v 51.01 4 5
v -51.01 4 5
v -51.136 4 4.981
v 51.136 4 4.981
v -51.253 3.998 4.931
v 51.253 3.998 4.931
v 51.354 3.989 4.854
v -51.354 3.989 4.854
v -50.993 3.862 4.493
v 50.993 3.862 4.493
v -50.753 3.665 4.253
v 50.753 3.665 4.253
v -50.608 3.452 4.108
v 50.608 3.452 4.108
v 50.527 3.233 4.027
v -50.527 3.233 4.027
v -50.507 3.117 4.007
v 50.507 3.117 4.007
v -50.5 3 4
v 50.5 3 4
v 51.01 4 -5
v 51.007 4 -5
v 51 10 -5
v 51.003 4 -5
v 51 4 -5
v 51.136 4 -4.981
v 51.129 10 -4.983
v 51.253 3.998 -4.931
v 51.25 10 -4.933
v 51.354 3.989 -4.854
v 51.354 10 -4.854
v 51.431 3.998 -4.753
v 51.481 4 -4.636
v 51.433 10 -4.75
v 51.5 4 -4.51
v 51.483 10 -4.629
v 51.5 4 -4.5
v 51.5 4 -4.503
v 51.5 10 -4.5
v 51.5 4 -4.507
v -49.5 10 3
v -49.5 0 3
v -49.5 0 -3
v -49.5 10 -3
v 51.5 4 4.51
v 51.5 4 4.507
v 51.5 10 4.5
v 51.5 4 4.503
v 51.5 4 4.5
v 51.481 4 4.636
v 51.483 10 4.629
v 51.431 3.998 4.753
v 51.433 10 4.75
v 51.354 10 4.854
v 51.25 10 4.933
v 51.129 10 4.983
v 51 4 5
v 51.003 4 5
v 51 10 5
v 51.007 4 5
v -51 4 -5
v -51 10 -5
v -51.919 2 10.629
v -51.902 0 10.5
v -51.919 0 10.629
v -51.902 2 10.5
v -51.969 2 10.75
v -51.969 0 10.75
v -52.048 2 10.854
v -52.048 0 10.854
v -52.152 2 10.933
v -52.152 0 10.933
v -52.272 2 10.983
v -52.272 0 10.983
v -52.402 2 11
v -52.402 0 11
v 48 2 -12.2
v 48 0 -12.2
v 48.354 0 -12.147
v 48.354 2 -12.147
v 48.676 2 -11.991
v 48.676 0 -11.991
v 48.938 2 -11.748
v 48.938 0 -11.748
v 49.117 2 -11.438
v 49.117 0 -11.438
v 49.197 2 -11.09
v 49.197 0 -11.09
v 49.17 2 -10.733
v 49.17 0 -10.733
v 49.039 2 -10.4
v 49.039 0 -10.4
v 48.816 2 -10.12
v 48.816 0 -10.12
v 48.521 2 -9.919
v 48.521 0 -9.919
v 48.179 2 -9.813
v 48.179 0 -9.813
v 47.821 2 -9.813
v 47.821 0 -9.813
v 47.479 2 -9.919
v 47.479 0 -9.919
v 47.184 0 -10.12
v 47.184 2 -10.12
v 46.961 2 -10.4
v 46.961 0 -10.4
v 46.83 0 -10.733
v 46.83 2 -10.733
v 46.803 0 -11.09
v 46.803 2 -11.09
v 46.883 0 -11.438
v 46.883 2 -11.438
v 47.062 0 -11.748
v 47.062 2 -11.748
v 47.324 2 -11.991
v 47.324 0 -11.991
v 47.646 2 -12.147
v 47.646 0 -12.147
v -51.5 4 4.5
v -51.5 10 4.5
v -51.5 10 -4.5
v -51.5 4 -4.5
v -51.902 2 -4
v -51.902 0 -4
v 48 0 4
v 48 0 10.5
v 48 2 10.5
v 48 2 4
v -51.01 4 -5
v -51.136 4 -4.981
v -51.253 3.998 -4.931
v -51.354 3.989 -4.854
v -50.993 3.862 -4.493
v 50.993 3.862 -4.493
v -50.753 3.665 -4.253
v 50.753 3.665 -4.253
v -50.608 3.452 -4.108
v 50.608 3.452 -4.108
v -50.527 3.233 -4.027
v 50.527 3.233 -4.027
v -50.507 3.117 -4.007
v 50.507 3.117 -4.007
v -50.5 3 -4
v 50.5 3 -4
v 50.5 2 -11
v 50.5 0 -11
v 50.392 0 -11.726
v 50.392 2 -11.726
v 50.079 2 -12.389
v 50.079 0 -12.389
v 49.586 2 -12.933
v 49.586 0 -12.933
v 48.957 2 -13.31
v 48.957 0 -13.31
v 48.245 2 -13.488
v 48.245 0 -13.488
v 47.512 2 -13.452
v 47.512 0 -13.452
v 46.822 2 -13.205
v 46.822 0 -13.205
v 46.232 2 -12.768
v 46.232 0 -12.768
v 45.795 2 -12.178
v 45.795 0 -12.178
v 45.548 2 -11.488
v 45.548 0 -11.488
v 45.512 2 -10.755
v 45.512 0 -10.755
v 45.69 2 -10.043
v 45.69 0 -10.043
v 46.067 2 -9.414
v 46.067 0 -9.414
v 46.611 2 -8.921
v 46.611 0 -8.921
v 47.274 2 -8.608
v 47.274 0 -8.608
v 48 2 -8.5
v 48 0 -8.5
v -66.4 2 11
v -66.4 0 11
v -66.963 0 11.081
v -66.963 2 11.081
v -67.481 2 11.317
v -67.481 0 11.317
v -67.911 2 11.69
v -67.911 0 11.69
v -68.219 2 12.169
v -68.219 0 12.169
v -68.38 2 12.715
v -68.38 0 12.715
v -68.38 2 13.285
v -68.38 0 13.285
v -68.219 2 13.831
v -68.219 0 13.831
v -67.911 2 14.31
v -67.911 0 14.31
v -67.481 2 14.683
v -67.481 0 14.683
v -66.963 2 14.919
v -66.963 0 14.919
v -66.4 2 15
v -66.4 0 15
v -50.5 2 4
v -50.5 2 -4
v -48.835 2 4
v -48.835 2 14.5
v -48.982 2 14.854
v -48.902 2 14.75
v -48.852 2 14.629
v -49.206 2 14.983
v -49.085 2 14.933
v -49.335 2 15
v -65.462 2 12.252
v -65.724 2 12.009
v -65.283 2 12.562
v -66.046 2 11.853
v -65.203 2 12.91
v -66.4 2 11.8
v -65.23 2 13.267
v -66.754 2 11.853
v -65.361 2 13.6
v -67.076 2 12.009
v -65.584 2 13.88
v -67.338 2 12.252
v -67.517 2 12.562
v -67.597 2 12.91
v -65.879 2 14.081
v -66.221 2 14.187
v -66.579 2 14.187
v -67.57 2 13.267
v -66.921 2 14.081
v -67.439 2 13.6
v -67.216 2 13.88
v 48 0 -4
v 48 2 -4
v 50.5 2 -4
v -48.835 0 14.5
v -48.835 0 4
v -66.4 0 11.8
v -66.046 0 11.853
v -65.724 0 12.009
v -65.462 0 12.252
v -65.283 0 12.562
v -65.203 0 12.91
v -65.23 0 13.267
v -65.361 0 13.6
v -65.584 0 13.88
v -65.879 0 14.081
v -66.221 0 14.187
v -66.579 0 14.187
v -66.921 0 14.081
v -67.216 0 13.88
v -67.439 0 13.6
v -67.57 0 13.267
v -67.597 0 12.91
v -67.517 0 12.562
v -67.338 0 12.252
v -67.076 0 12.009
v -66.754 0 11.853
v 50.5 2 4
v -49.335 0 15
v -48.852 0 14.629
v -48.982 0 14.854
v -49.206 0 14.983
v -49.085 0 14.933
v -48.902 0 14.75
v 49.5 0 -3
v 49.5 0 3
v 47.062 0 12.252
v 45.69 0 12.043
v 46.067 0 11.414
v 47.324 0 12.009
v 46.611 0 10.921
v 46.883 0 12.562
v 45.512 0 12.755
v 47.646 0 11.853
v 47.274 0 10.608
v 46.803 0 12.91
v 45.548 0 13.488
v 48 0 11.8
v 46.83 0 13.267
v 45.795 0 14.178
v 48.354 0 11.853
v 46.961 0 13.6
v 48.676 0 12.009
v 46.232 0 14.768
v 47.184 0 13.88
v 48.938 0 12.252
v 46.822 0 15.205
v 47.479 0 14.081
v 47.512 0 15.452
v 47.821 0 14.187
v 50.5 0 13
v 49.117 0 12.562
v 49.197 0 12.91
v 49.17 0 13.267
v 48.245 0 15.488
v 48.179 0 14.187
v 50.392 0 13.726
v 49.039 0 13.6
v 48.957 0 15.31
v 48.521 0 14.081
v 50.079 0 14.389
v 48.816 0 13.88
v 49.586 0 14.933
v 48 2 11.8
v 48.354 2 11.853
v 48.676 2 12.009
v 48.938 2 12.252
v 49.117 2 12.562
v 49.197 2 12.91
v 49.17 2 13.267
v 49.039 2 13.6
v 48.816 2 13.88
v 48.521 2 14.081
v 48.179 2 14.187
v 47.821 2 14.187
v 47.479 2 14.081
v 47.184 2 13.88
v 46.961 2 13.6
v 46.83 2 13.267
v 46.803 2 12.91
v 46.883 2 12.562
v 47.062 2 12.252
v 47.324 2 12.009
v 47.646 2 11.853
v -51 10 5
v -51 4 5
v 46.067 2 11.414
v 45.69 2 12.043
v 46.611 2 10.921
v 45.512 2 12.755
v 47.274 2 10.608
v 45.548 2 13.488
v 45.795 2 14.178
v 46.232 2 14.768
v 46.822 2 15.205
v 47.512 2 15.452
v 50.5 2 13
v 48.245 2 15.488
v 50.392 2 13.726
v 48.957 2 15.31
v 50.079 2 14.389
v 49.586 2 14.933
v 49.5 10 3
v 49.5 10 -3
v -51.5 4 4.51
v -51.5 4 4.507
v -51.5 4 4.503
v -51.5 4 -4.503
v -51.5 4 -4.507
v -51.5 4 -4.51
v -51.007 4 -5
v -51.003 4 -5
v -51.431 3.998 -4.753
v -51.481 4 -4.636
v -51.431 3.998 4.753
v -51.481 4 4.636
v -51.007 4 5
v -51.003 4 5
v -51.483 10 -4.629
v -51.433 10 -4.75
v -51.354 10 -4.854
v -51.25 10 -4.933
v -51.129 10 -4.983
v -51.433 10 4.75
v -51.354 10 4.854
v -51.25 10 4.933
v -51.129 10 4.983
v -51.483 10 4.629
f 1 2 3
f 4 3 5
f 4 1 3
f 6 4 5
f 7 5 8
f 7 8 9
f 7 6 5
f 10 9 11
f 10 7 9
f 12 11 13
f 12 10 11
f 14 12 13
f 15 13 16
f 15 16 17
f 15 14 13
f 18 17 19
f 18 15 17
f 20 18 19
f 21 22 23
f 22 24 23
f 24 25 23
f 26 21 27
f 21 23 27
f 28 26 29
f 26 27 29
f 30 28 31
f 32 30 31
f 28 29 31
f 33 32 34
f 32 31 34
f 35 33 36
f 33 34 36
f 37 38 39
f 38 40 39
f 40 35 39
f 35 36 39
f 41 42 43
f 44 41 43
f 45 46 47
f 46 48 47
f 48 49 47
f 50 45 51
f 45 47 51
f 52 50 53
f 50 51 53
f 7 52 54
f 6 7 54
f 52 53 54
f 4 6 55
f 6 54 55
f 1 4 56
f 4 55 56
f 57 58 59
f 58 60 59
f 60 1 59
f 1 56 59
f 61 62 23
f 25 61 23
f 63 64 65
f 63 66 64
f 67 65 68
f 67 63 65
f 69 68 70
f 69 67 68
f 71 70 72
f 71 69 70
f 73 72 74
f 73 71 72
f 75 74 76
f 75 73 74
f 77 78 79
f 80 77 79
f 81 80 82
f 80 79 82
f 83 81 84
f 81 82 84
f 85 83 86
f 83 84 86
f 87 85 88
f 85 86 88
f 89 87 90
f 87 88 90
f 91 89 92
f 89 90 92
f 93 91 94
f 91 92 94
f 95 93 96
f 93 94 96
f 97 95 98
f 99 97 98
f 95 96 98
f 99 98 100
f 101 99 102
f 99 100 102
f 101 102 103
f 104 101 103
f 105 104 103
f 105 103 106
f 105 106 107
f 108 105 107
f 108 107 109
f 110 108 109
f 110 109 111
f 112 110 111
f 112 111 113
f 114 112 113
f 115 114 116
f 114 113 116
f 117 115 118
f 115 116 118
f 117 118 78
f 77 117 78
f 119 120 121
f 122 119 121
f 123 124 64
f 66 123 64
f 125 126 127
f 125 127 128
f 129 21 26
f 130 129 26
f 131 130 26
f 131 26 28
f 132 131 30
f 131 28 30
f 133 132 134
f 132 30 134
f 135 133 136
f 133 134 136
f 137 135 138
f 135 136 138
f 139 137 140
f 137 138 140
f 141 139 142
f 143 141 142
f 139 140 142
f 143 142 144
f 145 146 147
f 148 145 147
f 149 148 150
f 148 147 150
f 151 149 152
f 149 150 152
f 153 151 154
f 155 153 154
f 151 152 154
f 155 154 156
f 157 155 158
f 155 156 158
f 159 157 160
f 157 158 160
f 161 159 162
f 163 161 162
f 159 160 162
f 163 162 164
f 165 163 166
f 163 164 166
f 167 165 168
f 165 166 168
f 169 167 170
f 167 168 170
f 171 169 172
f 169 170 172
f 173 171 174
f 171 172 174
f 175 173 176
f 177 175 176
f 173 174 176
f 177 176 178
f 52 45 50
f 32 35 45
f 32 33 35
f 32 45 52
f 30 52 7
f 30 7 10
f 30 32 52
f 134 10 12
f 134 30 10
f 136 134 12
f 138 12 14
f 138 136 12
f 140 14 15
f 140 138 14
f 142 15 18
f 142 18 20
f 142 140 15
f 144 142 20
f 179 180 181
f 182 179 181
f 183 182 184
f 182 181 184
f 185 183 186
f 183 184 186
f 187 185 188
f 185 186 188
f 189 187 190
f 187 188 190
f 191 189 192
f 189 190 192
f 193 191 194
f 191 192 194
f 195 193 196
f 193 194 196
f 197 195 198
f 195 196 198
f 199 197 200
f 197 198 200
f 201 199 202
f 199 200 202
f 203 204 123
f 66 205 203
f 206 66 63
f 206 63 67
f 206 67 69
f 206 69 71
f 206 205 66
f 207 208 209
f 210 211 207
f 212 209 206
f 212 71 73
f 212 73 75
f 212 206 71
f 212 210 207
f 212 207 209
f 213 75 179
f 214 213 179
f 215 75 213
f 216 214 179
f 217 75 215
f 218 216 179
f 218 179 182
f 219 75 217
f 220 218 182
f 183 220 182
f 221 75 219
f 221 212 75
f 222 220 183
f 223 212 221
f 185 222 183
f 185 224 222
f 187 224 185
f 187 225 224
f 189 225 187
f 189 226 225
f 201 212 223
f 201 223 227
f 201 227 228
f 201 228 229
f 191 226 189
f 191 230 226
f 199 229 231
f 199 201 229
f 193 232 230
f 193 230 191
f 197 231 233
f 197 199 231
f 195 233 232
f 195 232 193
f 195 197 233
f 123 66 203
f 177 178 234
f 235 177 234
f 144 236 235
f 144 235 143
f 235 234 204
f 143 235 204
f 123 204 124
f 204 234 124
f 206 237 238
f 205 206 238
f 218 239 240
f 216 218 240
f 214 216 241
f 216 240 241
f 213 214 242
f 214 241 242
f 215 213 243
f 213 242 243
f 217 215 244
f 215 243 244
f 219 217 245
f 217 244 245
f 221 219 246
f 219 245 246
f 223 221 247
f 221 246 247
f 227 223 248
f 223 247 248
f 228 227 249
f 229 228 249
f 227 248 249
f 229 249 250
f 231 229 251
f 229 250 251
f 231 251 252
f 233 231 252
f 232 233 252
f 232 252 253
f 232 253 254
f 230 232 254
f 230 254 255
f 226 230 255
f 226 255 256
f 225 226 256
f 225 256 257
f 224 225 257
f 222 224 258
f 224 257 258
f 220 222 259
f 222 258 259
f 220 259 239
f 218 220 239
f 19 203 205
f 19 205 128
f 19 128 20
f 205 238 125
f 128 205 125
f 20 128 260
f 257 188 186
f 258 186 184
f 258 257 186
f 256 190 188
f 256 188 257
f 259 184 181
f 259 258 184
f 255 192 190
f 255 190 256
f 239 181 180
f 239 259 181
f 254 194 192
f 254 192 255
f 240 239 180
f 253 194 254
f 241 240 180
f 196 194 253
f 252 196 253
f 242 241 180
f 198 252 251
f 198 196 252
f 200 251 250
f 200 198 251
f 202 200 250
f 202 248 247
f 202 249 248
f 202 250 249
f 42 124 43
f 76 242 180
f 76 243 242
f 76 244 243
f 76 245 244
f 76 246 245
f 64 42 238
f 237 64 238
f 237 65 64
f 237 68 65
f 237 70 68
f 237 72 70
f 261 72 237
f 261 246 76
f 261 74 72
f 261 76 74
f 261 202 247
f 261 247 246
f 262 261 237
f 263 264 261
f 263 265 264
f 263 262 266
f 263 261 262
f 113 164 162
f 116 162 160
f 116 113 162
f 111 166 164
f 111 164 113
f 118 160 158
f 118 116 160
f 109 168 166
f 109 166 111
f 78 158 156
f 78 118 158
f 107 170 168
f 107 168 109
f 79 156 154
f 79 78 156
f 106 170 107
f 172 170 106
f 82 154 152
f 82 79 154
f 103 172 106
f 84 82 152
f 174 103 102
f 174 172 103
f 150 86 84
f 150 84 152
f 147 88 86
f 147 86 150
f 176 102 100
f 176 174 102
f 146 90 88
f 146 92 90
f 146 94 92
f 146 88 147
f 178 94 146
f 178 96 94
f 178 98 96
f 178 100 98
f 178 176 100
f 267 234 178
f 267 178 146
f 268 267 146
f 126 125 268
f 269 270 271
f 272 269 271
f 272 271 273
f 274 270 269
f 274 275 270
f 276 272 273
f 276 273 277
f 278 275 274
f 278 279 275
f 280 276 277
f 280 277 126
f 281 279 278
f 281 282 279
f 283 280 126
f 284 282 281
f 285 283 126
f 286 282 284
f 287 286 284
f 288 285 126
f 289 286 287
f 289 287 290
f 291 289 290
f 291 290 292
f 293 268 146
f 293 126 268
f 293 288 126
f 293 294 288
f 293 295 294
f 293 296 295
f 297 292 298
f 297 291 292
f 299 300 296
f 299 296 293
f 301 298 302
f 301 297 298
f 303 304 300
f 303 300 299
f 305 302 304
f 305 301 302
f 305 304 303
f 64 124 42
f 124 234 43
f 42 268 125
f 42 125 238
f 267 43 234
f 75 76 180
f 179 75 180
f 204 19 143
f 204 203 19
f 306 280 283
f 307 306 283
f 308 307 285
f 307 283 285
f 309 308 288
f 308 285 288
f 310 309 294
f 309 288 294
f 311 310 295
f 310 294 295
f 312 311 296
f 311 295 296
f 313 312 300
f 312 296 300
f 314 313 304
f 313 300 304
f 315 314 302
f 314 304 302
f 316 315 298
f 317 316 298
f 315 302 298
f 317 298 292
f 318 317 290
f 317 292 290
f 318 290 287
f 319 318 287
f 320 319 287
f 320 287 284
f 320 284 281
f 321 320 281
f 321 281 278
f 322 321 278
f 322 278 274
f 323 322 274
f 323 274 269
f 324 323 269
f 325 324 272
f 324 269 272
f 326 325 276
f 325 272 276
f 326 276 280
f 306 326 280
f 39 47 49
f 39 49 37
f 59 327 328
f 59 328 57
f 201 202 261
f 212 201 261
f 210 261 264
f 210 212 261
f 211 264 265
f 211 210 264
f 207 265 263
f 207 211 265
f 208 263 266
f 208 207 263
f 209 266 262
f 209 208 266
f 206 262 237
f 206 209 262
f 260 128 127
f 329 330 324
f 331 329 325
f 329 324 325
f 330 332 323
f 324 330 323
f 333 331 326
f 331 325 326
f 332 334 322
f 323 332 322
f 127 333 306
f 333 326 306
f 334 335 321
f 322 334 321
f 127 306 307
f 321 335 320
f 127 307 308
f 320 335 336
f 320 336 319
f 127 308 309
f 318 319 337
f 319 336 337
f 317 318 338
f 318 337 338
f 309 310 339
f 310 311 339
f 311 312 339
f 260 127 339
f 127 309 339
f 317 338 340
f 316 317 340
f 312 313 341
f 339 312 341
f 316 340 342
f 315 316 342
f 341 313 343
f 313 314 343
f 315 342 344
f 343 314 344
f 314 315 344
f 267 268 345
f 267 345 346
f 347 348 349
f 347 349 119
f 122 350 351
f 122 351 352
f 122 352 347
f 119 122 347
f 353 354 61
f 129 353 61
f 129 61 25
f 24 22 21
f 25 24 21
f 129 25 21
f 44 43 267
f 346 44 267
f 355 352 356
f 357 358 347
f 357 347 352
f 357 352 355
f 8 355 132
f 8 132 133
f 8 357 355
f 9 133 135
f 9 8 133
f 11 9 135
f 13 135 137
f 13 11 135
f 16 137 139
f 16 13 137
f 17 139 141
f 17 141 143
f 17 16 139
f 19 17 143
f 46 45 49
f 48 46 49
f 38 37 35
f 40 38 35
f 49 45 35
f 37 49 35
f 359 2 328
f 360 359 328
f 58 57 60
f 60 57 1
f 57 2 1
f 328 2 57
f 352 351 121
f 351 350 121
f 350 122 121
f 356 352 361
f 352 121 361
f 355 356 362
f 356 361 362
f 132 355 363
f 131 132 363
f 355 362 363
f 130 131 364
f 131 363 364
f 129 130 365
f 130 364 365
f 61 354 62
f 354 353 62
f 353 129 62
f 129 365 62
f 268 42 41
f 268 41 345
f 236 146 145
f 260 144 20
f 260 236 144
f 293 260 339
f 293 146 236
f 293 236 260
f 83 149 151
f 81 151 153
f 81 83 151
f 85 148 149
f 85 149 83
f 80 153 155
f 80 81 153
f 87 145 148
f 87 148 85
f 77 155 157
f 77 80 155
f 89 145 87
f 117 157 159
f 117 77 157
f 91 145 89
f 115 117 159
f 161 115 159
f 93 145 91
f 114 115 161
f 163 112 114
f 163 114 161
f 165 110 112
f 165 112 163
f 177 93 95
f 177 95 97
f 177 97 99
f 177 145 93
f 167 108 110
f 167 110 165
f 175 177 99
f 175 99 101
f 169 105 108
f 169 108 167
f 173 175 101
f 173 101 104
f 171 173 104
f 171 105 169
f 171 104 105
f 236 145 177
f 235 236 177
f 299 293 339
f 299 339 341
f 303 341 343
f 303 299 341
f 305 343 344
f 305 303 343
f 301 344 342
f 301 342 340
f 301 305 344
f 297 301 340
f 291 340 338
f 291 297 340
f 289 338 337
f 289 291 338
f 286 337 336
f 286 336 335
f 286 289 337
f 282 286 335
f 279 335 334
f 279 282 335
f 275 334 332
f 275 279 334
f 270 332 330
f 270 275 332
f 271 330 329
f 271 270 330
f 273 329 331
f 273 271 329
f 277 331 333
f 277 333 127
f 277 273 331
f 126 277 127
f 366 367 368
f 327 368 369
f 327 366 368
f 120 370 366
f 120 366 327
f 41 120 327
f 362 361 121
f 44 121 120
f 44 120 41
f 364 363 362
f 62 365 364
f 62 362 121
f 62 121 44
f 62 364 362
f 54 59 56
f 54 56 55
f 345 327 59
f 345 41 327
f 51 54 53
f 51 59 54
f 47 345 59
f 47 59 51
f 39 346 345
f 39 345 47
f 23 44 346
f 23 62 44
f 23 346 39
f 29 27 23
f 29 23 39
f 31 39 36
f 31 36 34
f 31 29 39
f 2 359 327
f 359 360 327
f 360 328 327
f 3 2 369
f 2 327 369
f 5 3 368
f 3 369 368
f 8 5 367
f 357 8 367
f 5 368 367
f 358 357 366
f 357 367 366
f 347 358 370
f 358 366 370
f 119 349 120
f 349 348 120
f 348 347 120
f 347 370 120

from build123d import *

# Parameters (mm, degrees)
SKETCH1_W           = 101
SKETCH1_H           = 8
SKETCH1_W_2         = 99
SKETCH1_H_2         = 6
BOSS_EXTRUDE1_DEPTH = 10
SKETCH2_R           = 1.2
BOSS_EXTRUDE2_DEPTH = 2
SKETCH3_W           = 103
SKETCH3_H           = 10
SKETCH3_W_2         = 101
SKETCH3_H_2         = 8
BOSS_EXTRUDE3_DEPTH = 6
FILLET4_R           = 1
FILLET5_R           = 1
FILLET6_R           = 1
FILLET7_R           = 1
FILLET8_R           = 0.5
FILLET9_R           = 0.5


# Some blends are built 0.0001 mm under size
with BuildPart() as part:
    # Sketch1 → Boss-Extrude1 (new body)
    with BuildSketch(Plane(origin=(0, 0, 0), x_dir=(1, 0, 0), z_dir=(0, 1, 0))):
        Rectangle(SKETCH1_W, SKETCH1_H)
        Rectangle(SKETCH1_W_2, SKETCH1_H_2, mode=Mode.SUBTRACT)
    extrude(amount=BOSS_EXTRUDE1_DEPTH)

    # Sketch2 → Boss-Extrude2 (add)
    # profile 1 of 3: a face of its own
    with BuildSketch(Plane.XZ):
        with BuildLine():
            Line((48, 4), (50.5, 4))
            Line((50.5, 4), (50.5, 13))
            ThreePointArc((50.5, 13), (46.232233047, 14.767766953), (48, 10.5))
            Line((48, 10.5), (48, 4))
        make_face()
        with Locations(Location((48, 13, 0), (0, 0, 270))):
            Circle(SKETCH2_R, mode=Mode.SUBTRACT)
    # profile 2 of 3: a face of its own
    with BuildSketch(Plane.XZ):
        with BuildLine():
            Line((48, -4), (50.5, -4))
            Line((50.5, -4), (50.5, -11))
            ThreePointArc((50.5, -11), (46.232233047, -12.767766953), (48, -8.5))
            Line((48, -8.5), (48, -4))
        make_face()
        with Locations(Location((48, -11, 0), (0, 0, 270))):
            Circle(SKETCH2_R, mode=Mode.SUBTRACT)
    # profile 3 of 3: a face of its own
    with BuildSketch(Plane.XZ):
        with BuildLine():
            Line((-66.4, 15), (-48.835058433, 15))
            Line((-48.835058433, 15), (-48.835058433, 4))
            Line((-48.835058433, 4), (-50.5, 4))
            Line((-50.5, 4), (-50.5, -4))
            Line((-50.5, -4), (-51.901659191, -4))
            Line((-51.901659191, -4), (-51.901659191, 11))
            Line((-51.901659191, 11), (-66.4, 11))
            ThreePointArc((-66.4, 11), (-68.4, 13), (-66.4, 15))
        make_face()
        with Locations(Location((-66.4, 13, 0), (0, 0, 270))):
            Circle(SKETCH2_R, mode=Mode.SUBTRACT)
    extrude(amount=-BOSS_EXTRUDE2_DEPTH)

    # Sketch3 → Boss-Extrude3 (add)
    with BuildSketch(Plane(origin=(0, 10, 0), x_dir=(1, 0, 0), z_dir=(0, 1, 0))):
        Rectangle(SKETCH3_W, SKETCH3_H)
        Rectangle(SKETCH3_W_2, SKETCH3_H_2, mode=Mode.SUBTRACT)
    extrude(amount=-BOSS_EXTRUDE3_DEPTH)

    # Fillet4
    fillet4_edges = [part.edges().sort_by_distance(p)[0] for p in [
        (0, 4, -4),
    ]]
    fillet(fillet4_edges, radius=FILLET4_R - 0.0001)  # a hair under: the kernel refuses the full size

    # Fillet5
    fillet5_edges = [part.edges().sort_by_distance(p)[0] for p in [
        (0, 4, 4),
    ]]
    fillet(fillet5_edges, radius=FILLET5_R - 0.0001)  # a hair under: the kernel refuses the full size

    # Fillet6
    fillet6_edges = [part.edges().sort_by_distance(p)[0] for p in [
        (50.5, 4, 0),
    ]]
    fillet(fillet6_edges, radius=FILLET6_R - 0.0001)  # a hair under: the kernel refuses the full size

    # Fillet7
    fillet7_edges = [part.edges().sort_by_distance(p)[0] for p in [
        (-50.5, 4, 0),
    ]]
    fillet(fillet7_edges, radius=FILLET7_R - 0.0001)  # a hair under: the kernel refuses the full size

    # Fillet8
    fillet8_edges = [part.edges().sort_by_distance(p)[0] for p in [
        (-51.901659191, 1, 11),
        (-48.835058433, 1, 15),
    ]]
    fillet(fillet8_edges, radius=FILLET8_R)

    # Fillet9
    # the kernel refuses this fillet: 0.5 mm, written as the material it takes off along each edge
    with BuildSketch(Plane(origin=(51.5, 11.25, -5), x_dir=(-1, 0, 0), z_dir=(0, -1, 0))) as fillet9_piece_1:
        with BuildLine():
            CenterArc((FILLET9_R, -FILLET9_R), FILLET9_R, 90, 90)
            Line((0, -FILLET9_R), (0, 0))
            Line((0, 0), (FILLET9_R, 0))
        make_face()
    extrude(amount=8.5, mode=Mode.SUBTRACT)
    with BuildSketch(Plane(origin=(51.5, 11.25, 5), x_dir=(-1, 0, 0), z_dir=(0, -1, 0)), Plane(origin=(-51.5, 11.25, 5), x_dir=(0, 0, -1), z_dir=(0, -1, 0)), Plane(origin=(-51.5, 11.25, -5), x_dir=(1, 0, 0), z_dir=(0, -1, 0))) as fillet9_piece_2:
        with BuildLine():
            CenterArc((FILLET9_R, FILLET9_R), FILLET9_R, 180, 90)
            Line((0, FILLET9_R), (0, 0))
            Line((0, 0), (FILLET9_R, 0))
        make_face()
    extrude(amount=8.5, mode=Mode.SUBTRACT)


solid = part.part
